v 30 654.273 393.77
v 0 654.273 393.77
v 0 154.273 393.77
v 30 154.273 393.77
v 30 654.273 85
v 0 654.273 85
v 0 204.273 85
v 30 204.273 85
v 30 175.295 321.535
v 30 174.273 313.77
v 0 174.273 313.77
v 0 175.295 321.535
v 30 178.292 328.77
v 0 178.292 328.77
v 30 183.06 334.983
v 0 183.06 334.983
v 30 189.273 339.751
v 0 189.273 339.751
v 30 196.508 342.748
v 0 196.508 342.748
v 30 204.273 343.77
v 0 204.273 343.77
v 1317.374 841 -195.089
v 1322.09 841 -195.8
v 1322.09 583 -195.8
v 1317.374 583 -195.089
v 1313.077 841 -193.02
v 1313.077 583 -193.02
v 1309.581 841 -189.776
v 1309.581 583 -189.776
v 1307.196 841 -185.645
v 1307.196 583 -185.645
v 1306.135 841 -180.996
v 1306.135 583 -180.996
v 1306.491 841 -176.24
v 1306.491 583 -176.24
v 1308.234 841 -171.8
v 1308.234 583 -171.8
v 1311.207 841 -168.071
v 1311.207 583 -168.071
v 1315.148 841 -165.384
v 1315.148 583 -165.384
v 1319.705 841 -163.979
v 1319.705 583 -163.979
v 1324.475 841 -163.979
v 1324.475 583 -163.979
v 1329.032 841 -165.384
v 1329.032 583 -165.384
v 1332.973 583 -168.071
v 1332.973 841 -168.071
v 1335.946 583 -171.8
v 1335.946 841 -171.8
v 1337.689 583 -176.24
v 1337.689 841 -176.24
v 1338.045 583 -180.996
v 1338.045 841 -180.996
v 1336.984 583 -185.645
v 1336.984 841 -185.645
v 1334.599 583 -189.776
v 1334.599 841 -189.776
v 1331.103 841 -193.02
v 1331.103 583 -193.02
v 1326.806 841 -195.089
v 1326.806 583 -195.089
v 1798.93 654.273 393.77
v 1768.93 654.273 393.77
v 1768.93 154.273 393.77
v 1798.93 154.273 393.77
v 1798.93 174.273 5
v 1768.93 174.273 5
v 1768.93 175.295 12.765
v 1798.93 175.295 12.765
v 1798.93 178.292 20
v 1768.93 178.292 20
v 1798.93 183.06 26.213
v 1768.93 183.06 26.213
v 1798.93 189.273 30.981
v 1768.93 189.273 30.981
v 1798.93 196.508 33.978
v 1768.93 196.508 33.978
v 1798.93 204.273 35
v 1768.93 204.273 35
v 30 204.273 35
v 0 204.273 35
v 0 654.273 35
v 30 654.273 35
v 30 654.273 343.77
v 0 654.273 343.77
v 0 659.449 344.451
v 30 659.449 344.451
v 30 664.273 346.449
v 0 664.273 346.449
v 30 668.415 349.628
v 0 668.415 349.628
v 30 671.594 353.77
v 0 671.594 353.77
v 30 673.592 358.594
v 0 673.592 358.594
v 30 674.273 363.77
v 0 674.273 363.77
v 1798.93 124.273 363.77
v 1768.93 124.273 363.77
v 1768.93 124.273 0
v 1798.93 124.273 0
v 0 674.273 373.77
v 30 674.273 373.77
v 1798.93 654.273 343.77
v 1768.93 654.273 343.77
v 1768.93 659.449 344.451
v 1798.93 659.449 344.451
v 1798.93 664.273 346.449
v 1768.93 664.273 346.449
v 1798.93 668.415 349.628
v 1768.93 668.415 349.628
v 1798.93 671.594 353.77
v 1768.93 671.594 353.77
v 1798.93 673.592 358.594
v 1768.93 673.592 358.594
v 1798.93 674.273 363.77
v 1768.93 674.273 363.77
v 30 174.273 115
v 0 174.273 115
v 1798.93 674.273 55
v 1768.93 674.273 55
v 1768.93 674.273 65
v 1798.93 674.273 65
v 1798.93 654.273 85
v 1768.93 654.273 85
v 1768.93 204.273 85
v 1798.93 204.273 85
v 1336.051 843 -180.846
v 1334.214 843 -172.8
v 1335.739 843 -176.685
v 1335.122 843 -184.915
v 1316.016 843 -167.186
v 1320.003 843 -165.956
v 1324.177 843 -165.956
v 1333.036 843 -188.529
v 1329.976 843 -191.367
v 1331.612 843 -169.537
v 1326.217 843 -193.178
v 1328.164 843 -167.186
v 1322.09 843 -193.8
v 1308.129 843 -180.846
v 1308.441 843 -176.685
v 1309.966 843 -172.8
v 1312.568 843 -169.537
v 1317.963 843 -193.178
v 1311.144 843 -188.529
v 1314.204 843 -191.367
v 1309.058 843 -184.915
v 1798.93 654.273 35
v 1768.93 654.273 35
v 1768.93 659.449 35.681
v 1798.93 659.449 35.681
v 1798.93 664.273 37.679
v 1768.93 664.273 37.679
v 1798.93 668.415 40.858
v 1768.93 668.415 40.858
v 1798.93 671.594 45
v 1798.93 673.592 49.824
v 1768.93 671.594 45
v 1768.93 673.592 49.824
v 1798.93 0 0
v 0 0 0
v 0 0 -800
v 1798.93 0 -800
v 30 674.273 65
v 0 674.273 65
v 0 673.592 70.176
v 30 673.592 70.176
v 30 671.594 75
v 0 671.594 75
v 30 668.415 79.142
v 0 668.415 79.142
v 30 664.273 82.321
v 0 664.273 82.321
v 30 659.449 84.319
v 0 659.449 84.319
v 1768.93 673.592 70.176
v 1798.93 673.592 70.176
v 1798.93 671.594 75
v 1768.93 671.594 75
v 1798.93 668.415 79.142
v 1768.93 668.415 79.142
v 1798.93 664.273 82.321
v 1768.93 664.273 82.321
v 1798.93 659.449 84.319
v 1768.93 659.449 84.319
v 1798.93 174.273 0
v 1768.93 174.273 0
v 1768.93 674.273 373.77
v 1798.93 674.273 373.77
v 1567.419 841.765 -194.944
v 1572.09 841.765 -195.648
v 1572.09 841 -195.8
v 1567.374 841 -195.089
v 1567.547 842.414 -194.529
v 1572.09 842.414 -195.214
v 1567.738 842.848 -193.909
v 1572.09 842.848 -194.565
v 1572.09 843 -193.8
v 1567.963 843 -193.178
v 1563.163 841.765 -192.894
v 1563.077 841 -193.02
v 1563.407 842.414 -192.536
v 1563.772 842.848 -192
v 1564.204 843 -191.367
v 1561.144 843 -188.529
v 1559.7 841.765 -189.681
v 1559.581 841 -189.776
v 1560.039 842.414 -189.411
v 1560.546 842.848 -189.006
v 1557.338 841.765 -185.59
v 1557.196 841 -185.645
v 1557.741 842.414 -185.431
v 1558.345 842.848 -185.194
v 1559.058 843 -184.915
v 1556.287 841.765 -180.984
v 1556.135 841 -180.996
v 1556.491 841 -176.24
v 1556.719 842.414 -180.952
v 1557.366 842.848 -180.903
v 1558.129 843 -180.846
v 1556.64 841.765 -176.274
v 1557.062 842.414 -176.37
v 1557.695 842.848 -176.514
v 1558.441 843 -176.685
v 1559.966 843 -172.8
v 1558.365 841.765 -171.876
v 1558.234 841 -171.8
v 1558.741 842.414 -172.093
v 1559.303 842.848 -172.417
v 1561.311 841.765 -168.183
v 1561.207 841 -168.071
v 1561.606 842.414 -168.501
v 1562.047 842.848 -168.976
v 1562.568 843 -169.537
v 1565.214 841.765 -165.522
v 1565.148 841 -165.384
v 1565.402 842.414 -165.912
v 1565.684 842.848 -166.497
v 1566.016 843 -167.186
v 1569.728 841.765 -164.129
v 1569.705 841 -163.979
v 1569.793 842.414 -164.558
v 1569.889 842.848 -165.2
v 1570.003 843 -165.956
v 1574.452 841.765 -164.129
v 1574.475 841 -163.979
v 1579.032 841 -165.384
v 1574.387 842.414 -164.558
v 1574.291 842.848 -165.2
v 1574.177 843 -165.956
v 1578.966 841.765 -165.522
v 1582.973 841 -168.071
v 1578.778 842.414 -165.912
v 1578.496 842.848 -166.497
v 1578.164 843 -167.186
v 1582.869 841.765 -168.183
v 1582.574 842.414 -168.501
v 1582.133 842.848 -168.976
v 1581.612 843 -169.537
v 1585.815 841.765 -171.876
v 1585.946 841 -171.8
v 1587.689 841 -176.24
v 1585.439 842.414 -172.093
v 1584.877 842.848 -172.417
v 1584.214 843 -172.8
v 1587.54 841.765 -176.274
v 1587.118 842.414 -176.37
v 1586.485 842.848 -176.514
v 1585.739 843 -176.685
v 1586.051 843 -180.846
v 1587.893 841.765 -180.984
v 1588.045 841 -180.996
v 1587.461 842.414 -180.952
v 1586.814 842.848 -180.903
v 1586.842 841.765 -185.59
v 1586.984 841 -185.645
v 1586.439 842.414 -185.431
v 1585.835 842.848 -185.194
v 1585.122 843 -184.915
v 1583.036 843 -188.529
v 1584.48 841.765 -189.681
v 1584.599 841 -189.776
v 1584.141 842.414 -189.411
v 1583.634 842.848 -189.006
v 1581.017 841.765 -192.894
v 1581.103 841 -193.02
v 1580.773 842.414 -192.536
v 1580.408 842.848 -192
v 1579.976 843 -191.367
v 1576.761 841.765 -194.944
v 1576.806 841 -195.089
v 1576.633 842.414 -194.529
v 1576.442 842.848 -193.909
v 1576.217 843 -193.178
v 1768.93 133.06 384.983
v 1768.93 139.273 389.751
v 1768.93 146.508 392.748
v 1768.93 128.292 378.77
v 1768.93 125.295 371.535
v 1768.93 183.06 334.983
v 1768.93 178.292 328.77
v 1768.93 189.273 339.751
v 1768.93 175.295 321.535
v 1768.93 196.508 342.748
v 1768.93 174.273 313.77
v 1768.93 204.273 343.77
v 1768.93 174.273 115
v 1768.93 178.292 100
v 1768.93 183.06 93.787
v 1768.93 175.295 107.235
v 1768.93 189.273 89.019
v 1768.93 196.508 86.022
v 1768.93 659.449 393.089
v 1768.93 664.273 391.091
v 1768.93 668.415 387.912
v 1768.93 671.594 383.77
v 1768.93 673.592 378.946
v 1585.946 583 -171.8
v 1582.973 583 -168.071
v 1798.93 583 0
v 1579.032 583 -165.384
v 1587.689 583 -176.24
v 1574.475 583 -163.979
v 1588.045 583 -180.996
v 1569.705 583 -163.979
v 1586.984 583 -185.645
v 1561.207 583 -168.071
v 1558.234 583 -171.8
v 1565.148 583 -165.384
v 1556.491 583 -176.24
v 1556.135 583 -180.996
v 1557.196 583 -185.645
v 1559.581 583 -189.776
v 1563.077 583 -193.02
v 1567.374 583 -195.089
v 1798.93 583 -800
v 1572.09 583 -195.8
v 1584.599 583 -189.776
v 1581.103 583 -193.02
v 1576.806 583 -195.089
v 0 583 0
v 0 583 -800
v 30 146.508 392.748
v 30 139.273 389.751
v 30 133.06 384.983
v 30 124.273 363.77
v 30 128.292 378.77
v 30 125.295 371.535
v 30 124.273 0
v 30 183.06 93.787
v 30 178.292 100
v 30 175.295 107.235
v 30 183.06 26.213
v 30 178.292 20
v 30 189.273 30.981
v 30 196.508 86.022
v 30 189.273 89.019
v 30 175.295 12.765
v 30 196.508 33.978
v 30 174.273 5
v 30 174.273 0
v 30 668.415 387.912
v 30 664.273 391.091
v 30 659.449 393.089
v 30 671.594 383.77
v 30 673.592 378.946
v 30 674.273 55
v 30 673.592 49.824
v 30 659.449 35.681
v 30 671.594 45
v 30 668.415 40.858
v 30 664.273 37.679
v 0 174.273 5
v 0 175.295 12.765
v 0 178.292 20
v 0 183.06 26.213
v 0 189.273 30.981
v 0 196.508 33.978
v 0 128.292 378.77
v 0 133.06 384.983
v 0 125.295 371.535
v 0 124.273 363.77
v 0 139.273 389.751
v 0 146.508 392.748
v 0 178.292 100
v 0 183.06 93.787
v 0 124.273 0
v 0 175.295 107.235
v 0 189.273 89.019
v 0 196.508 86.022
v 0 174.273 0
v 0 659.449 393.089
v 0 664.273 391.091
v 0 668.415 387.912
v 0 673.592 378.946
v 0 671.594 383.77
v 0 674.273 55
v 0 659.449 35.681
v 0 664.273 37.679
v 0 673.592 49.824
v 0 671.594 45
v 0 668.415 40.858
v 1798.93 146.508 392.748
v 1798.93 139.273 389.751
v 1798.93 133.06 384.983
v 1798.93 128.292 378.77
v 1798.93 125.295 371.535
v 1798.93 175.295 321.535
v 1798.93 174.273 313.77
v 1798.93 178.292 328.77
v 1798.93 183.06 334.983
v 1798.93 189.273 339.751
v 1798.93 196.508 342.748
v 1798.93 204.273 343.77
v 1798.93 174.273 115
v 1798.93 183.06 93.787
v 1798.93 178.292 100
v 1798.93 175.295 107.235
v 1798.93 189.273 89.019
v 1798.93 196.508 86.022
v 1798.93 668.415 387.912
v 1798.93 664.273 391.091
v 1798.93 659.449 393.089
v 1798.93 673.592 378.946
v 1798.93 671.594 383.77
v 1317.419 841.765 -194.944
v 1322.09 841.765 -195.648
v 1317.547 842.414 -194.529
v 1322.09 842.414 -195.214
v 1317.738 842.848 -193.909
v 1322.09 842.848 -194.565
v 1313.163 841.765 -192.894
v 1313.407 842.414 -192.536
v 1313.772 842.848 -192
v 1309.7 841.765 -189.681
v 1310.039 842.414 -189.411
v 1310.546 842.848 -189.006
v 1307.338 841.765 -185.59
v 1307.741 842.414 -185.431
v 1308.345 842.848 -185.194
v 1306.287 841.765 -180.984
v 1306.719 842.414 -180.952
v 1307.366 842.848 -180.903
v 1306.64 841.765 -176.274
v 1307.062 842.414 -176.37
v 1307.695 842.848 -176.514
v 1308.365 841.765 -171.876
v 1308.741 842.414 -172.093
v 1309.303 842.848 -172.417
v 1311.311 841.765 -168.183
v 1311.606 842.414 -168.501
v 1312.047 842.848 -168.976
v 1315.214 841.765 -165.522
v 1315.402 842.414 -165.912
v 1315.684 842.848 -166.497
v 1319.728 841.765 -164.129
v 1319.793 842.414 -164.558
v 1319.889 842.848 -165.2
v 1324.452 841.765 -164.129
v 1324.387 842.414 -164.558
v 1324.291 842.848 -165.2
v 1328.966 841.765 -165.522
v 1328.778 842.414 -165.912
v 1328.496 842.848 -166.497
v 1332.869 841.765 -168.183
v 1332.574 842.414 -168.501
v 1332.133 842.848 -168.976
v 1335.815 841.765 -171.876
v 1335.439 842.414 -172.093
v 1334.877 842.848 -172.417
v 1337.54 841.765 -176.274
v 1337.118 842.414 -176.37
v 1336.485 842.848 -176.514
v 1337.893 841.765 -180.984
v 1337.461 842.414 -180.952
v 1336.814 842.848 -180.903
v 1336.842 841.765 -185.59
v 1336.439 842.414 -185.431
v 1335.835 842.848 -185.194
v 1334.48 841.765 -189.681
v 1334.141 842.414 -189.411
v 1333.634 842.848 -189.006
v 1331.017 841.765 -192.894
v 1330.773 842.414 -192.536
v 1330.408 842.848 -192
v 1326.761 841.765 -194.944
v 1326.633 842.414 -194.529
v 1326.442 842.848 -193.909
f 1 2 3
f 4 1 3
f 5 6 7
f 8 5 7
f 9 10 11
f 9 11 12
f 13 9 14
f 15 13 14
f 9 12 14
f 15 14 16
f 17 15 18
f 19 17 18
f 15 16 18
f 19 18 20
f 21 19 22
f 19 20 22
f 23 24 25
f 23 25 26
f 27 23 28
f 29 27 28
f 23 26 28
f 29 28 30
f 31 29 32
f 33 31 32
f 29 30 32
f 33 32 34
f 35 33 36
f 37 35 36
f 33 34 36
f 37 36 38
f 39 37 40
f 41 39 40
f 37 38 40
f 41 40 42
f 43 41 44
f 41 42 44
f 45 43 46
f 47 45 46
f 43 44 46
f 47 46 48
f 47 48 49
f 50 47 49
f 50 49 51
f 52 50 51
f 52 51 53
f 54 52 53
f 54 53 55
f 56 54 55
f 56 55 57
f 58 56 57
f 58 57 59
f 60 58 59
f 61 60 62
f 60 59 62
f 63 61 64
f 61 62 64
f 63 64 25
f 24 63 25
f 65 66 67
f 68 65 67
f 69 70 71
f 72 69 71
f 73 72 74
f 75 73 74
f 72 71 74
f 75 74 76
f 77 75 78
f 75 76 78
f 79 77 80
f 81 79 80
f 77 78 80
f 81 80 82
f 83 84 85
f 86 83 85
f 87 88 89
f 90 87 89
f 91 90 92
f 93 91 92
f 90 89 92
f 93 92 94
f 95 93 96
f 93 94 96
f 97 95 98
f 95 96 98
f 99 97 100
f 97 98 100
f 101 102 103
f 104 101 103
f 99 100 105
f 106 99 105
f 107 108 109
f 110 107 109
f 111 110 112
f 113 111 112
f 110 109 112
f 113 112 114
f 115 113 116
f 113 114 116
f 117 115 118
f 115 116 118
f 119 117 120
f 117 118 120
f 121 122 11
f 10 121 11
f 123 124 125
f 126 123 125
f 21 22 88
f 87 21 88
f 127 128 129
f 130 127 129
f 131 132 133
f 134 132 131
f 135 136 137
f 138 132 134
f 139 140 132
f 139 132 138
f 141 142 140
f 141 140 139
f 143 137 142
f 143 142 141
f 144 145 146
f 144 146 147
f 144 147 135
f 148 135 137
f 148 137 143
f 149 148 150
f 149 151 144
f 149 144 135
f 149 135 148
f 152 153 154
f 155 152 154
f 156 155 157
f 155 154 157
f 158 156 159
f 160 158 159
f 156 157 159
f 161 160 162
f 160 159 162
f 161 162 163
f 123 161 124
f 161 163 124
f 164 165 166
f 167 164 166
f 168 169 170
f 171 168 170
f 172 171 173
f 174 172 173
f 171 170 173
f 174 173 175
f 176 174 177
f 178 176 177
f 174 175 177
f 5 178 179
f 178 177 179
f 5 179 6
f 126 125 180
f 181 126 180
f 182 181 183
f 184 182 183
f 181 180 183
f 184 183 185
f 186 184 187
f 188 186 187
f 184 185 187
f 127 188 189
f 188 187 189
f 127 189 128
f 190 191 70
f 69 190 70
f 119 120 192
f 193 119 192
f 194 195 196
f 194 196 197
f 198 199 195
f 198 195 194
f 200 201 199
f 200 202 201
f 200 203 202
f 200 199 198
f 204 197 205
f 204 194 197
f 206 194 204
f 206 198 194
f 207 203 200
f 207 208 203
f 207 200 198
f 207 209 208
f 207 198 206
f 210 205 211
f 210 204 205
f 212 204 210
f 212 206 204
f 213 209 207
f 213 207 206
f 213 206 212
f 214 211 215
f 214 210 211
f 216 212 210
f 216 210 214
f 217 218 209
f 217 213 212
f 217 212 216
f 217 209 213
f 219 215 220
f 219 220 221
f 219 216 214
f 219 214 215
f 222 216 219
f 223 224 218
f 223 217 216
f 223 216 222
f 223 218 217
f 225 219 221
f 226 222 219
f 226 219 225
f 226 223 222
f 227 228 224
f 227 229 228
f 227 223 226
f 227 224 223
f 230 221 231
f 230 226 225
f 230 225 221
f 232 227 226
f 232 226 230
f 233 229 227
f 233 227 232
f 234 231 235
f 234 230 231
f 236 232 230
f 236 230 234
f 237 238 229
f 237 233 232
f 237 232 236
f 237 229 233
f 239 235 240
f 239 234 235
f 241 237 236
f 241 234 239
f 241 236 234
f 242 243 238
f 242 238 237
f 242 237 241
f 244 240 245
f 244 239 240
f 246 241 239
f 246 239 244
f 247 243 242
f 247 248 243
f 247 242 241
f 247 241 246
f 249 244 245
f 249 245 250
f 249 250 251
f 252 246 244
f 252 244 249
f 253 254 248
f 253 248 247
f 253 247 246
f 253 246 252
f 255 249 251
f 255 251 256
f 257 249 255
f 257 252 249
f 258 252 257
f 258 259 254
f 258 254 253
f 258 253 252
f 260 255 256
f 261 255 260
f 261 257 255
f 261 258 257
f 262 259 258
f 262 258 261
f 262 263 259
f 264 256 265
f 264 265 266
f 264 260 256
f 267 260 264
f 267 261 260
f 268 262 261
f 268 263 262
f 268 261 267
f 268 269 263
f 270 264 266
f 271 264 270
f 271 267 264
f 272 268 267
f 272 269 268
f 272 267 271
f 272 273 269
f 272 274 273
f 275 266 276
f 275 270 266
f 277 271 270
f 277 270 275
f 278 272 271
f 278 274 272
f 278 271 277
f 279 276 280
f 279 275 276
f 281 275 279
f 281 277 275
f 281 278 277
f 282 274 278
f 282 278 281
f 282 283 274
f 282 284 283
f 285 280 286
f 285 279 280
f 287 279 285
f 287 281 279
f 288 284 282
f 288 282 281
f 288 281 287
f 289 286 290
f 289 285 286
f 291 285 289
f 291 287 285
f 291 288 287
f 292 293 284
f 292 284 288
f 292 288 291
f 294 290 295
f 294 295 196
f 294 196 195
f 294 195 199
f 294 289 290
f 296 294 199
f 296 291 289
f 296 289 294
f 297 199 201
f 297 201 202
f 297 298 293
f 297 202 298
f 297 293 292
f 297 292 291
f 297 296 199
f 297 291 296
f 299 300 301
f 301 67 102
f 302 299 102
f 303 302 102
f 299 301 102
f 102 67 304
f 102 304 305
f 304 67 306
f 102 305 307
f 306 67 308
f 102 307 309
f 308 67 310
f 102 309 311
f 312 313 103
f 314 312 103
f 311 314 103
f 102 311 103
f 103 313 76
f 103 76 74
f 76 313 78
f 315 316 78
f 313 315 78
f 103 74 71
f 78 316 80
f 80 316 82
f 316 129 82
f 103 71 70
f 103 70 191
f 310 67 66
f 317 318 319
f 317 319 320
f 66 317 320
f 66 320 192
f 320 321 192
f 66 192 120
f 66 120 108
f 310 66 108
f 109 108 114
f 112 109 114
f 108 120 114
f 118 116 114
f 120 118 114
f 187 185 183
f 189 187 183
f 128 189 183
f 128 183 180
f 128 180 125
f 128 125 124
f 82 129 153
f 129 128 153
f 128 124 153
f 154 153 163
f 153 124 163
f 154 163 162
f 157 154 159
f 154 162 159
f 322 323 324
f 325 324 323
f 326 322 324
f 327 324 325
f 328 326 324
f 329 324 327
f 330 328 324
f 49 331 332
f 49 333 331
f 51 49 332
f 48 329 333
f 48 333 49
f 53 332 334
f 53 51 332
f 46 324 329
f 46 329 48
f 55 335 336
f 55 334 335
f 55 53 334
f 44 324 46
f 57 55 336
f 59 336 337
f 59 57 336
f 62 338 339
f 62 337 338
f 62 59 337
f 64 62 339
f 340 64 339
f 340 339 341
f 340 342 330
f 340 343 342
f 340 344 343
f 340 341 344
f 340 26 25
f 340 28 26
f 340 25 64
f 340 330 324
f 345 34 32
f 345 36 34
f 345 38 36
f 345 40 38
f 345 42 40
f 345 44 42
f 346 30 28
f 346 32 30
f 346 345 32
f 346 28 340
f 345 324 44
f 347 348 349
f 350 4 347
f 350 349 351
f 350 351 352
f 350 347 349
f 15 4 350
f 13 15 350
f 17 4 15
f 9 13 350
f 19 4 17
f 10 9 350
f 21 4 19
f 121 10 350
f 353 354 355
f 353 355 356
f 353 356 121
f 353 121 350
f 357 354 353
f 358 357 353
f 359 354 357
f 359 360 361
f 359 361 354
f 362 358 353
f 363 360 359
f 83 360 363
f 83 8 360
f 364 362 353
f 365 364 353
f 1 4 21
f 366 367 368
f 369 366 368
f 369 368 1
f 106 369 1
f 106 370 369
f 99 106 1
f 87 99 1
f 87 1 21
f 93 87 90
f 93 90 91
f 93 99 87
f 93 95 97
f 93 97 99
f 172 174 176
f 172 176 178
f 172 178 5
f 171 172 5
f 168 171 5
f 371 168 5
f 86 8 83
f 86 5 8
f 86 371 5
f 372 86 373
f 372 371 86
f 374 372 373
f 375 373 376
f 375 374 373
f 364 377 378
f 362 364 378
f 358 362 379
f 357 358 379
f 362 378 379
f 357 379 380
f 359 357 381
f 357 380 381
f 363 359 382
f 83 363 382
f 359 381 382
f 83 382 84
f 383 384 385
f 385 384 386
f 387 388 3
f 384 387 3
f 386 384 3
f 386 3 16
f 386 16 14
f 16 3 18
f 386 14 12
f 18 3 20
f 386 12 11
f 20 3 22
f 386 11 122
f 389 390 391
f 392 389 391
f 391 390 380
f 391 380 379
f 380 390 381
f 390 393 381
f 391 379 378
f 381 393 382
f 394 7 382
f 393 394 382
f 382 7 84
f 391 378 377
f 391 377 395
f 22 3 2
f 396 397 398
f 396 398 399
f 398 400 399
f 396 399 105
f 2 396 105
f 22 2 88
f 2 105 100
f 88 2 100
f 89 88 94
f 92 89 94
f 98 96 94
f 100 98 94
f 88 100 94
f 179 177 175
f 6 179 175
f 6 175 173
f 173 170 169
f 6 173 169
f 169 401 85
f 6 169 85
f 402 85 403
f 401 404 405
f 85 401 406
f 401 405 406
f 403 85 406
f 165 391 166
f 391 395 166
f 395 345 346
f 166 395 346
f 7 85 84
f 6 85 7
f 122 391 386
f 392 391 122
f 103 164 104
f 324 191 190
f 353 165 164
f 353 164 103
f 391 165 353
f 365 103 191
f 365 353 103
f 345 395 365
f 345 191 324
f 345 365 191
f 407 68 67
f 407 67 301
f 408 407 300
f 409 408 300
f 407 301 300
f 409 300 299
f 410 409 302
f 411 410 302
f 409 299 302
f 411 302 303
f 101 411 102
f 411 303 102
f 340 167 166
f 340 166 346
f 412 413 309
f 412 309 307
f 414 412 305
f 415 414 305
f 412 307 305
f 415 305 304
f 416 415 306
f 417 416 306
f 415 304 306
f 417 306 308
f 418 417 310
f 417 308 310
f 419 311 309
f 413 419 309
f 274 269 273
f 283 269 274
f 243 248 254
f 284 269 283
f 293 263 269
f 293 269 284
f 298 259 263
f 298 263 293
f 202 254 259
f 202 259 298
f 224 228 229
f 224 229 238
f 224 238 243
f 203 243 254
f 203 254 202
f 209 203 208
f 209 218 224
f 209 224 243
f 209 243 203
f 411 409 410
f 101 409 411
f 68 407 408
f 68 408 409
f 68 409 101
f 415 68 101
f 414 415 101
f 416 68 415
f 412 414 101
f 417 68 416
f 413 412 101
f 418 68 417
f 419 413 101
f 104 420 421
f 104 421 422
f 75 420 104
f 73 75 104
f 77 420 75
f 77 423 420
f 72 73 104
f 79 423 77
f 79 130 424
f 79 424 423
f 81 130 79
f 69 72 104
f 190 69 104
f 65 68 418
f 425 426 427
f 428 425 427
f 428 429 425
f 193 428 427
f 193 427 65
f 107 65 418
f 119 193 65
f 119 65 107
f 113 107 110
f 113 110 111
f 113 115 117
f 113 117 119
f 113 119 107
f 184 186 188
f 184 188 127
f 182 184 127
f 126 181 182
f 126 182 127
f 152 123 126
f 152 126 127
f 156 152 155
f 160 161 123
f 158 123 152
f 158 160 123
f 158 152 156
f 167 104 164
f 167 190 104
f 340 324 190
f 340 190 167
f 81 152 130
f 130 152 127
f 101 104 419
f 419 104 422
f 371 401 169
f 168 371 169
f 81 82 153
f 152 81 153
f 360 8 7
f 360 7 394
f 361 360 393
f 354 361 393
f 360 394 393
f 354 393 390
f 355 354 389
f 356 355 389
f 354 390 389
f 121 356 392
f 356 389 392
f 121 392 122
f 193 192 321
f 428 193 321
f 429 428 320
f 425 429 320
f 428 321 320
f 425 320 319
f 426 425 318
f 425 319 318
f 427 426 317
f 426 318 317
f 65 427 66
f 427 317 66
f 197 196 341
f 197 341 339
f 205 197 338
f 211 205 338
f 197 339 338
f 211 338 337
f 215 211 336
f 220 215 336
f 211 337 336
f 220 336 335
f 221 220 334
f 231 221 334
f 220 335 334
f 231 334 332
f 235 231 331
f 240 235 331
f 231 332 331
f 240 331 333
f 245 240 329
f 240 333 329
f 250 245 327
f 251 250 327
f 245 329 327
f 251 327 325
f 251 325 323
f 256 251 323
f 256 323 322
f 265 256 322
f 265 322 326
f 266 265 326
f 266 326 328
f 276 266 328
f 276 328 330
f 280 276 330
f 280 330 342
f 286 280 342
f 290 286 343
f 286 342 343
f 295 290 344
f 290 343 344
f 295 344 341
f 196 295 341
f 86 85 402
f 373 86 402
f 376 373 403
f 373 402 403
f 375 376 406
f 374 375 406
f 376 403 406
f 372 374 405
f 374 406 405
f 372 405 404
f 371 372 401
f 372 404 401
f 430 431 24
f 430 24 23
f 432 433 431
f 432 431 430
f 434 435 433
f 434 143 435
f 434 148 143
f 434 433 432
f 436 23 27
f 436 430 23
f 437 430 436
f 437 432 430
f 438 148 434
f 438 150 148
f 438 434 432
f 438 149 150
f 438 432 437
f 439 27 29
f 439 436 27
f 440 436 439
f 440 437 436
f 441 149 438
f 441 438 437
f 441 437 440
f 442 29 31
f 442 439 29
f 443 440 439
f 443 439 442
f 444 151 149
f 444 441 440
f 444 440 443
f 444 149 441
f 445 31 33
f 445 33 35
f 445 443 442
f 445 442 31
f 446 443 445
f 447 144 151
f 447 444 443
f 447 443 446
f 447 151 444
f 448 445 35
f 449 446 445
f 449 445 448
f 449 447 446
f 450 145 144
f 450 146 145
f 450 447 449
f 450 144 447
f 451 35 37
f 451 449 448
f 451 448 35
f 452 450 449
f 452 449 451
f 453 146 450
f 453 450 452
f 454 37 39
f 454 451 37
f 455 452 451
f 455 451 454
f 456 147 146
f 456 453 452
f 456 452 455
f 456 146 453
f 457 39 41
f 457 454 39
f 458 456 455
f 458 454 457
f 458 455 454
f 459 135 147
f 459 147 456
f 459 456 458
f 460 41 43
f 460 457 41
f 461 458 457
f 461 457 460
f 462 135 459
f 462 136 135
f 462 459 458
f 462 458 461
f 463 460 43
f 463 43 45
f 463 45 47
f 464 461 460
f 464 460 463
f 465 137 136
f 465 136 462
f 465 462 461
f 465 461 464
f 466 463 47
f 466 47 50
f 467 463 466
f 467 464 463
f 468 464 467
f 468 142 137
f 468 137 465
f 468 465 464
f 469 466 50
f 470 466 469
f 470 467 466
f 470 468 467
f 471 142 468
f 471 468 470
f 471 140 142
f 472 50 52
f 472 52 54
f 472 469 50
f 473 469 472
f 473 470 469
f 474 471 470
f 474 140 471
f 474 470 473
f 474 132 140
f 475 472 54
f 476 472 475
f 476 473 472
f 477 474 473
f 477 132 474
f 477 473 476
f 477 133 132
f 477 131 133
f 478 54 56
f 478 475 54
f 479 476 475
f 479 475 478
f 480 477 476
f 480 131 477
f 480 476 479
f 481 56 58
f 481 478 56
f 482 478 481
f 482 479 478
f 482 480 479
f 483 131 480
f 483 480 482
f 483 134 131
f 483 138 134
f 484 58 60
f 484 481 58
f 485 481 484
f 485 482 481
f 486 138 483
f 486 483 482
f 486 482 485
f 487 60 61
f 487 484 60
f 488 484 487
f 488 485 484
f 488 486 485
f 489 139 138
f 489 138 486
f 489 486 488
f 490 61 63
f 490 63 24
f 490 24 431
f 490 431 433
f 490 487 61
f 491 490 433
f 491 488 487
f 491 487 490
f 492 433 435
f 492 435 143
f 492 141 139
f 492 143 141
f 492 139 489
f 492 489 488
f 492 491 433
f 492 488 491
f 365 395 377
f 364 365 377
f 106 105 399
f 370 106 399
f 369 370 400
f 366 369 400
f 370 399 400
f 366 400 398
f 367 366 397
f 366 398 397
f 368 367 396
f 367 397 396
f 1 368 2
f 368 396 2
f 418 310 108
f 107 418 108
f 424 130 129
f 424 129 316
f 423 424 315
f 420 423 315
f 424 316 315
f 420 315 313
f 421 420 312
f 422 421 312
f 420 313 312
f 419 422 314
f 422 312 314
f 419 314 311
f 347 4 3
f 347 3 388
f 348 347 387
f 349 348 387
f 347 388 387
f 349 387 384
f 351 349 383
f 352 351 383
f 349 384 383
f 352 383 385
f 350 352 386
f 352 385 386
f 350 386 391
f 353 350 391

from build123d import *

# Parameters (mm, degrees)
SKETCH1_W           = 800
SKETCH1_H           = 583
BOSS_EXTRUDE1_DEPTH = 1798.93
SKETCH2_R           = 16
BOSS_EXTRUDE2_DEPTH = 260
LPATTERN1_COUNT     = 2
LPATTERN1_PITCH     = 250
BOSS_EXTRUDE4_DEPTH = 30
LPATTERN3_COUNT     = 2
LPATTERN3_PITCH     = 1768.93
FILLET1_R           = 2


with BuildPart() as part:
    # Sketch1 → Boss-Extrude1 (new body)
    with BuildSketch(Plane(origin=(0, 0, 0), x_dir=(0, 0, -1), z_dir=(1, 0, 0))):
        with Locations((400, 291.5)):
            Rectangle(SKETCH1_W, SKETCH1_H)
    extrude(amount=BOSS_EXTRUDE1_DEPTH)

    # Sketch2 → Boss-Extrude2 (add)
    with BuildSketch(Plane(origin=(0, 583, 0), x_dir=(1, 0, 0), z_dir=(0, 1, 0))):
        with Locations(Location((1572.09, 179.8, 0), (0, 0, 90))):
            Circle(SKETCH2_R)
    boss_extrude2 = extrude(amount=BOSS_EXTRUDE2_DEPTH)

    # LPattern1: Boss-Extrude2 ×2
    with Locations(*[(-i * LPATTERN1_PITCH, 0, 0) for i in range(1, LPATTERN1_COUNT)]):
        add(boss_extrude2)

    # Sketch3 → Boss-Extrude4 (add)
    with BuildSketch(Plane.ZY):
        with BuildLine():
            Line((0, 174.272998957), (5, 174.272998957))
            ThreePointArc((5, 174.272998957), (26.213203436, 183.059795522), (35, 204.272998957))
            Line((35, 204.272998957), (35, 654.272998957))
            ThreePointArc((35, 654.272998957), (40.857864376, 668.415134581), (55, 674.272998957))
            Line((55, 674.272998957), (65, 674.272998957))
            ThreePointArc((65, 674.272998957), (79.142135624, 668.415134581), (85, 654.272998957))
            Line((85, 654.272998957), (85, 204.272998957))
            ThreePointArc((85, 204.272998957), (93.786796564, 183.059795522), (115, 174.272998957))
            Line((115, 174.272998957), (313.77, 174.272998957))
            ThreePointArc((313.77, 174.272998957), (334.983203436, 183.059795522), (343.77, 204.272998957))
            Line((343.77, 204.272998957), (343.77, 654.272998957))
            ThreePointArc((343.77, 654.272998957), (349.627864376, 668.415134581), (363.77, 674.272998957))
            Line((363.77, 674.272998957), (373.77, 674.272998957))
            ThreePointArc((373.77, 674.272998957), (387.912135624, 668.415134581), (393.77, 654.272998957))
            Line((393.77, 654.272998957), (393.77, 154.272998957))
            ThreePointArc((393.77, 154.272998957), (384.983203436, 133.059795522), (363.77, 124.272998957))
            Line((363.77, 124.272998957), (0, 124.272998957))
            Line((0, 124.272998957), (0, 174.272998957))
        make_face()
    boss_extrude4 = extrude(amount=-BOSS_EXTRUDE4_DEPTH)

    # LPattern3: Boss-Extrude4 ×2
    with Locations(*[(i * LPATTERN3_PITCH, 0, 0) for i in range(1, LPATTERN3_COUNT)]):
        add(boss_extrude4)

    # Fillet1
    fillet1_edges = [part.edges().sort_by_distance(p)[0] for p in [
        (1572.09, 843, -163.8),
        (1322.09, 843, -163.8),
    ]]
    fillet(fillet1_edges, radius=FILLET1_R)


solid = part.part
